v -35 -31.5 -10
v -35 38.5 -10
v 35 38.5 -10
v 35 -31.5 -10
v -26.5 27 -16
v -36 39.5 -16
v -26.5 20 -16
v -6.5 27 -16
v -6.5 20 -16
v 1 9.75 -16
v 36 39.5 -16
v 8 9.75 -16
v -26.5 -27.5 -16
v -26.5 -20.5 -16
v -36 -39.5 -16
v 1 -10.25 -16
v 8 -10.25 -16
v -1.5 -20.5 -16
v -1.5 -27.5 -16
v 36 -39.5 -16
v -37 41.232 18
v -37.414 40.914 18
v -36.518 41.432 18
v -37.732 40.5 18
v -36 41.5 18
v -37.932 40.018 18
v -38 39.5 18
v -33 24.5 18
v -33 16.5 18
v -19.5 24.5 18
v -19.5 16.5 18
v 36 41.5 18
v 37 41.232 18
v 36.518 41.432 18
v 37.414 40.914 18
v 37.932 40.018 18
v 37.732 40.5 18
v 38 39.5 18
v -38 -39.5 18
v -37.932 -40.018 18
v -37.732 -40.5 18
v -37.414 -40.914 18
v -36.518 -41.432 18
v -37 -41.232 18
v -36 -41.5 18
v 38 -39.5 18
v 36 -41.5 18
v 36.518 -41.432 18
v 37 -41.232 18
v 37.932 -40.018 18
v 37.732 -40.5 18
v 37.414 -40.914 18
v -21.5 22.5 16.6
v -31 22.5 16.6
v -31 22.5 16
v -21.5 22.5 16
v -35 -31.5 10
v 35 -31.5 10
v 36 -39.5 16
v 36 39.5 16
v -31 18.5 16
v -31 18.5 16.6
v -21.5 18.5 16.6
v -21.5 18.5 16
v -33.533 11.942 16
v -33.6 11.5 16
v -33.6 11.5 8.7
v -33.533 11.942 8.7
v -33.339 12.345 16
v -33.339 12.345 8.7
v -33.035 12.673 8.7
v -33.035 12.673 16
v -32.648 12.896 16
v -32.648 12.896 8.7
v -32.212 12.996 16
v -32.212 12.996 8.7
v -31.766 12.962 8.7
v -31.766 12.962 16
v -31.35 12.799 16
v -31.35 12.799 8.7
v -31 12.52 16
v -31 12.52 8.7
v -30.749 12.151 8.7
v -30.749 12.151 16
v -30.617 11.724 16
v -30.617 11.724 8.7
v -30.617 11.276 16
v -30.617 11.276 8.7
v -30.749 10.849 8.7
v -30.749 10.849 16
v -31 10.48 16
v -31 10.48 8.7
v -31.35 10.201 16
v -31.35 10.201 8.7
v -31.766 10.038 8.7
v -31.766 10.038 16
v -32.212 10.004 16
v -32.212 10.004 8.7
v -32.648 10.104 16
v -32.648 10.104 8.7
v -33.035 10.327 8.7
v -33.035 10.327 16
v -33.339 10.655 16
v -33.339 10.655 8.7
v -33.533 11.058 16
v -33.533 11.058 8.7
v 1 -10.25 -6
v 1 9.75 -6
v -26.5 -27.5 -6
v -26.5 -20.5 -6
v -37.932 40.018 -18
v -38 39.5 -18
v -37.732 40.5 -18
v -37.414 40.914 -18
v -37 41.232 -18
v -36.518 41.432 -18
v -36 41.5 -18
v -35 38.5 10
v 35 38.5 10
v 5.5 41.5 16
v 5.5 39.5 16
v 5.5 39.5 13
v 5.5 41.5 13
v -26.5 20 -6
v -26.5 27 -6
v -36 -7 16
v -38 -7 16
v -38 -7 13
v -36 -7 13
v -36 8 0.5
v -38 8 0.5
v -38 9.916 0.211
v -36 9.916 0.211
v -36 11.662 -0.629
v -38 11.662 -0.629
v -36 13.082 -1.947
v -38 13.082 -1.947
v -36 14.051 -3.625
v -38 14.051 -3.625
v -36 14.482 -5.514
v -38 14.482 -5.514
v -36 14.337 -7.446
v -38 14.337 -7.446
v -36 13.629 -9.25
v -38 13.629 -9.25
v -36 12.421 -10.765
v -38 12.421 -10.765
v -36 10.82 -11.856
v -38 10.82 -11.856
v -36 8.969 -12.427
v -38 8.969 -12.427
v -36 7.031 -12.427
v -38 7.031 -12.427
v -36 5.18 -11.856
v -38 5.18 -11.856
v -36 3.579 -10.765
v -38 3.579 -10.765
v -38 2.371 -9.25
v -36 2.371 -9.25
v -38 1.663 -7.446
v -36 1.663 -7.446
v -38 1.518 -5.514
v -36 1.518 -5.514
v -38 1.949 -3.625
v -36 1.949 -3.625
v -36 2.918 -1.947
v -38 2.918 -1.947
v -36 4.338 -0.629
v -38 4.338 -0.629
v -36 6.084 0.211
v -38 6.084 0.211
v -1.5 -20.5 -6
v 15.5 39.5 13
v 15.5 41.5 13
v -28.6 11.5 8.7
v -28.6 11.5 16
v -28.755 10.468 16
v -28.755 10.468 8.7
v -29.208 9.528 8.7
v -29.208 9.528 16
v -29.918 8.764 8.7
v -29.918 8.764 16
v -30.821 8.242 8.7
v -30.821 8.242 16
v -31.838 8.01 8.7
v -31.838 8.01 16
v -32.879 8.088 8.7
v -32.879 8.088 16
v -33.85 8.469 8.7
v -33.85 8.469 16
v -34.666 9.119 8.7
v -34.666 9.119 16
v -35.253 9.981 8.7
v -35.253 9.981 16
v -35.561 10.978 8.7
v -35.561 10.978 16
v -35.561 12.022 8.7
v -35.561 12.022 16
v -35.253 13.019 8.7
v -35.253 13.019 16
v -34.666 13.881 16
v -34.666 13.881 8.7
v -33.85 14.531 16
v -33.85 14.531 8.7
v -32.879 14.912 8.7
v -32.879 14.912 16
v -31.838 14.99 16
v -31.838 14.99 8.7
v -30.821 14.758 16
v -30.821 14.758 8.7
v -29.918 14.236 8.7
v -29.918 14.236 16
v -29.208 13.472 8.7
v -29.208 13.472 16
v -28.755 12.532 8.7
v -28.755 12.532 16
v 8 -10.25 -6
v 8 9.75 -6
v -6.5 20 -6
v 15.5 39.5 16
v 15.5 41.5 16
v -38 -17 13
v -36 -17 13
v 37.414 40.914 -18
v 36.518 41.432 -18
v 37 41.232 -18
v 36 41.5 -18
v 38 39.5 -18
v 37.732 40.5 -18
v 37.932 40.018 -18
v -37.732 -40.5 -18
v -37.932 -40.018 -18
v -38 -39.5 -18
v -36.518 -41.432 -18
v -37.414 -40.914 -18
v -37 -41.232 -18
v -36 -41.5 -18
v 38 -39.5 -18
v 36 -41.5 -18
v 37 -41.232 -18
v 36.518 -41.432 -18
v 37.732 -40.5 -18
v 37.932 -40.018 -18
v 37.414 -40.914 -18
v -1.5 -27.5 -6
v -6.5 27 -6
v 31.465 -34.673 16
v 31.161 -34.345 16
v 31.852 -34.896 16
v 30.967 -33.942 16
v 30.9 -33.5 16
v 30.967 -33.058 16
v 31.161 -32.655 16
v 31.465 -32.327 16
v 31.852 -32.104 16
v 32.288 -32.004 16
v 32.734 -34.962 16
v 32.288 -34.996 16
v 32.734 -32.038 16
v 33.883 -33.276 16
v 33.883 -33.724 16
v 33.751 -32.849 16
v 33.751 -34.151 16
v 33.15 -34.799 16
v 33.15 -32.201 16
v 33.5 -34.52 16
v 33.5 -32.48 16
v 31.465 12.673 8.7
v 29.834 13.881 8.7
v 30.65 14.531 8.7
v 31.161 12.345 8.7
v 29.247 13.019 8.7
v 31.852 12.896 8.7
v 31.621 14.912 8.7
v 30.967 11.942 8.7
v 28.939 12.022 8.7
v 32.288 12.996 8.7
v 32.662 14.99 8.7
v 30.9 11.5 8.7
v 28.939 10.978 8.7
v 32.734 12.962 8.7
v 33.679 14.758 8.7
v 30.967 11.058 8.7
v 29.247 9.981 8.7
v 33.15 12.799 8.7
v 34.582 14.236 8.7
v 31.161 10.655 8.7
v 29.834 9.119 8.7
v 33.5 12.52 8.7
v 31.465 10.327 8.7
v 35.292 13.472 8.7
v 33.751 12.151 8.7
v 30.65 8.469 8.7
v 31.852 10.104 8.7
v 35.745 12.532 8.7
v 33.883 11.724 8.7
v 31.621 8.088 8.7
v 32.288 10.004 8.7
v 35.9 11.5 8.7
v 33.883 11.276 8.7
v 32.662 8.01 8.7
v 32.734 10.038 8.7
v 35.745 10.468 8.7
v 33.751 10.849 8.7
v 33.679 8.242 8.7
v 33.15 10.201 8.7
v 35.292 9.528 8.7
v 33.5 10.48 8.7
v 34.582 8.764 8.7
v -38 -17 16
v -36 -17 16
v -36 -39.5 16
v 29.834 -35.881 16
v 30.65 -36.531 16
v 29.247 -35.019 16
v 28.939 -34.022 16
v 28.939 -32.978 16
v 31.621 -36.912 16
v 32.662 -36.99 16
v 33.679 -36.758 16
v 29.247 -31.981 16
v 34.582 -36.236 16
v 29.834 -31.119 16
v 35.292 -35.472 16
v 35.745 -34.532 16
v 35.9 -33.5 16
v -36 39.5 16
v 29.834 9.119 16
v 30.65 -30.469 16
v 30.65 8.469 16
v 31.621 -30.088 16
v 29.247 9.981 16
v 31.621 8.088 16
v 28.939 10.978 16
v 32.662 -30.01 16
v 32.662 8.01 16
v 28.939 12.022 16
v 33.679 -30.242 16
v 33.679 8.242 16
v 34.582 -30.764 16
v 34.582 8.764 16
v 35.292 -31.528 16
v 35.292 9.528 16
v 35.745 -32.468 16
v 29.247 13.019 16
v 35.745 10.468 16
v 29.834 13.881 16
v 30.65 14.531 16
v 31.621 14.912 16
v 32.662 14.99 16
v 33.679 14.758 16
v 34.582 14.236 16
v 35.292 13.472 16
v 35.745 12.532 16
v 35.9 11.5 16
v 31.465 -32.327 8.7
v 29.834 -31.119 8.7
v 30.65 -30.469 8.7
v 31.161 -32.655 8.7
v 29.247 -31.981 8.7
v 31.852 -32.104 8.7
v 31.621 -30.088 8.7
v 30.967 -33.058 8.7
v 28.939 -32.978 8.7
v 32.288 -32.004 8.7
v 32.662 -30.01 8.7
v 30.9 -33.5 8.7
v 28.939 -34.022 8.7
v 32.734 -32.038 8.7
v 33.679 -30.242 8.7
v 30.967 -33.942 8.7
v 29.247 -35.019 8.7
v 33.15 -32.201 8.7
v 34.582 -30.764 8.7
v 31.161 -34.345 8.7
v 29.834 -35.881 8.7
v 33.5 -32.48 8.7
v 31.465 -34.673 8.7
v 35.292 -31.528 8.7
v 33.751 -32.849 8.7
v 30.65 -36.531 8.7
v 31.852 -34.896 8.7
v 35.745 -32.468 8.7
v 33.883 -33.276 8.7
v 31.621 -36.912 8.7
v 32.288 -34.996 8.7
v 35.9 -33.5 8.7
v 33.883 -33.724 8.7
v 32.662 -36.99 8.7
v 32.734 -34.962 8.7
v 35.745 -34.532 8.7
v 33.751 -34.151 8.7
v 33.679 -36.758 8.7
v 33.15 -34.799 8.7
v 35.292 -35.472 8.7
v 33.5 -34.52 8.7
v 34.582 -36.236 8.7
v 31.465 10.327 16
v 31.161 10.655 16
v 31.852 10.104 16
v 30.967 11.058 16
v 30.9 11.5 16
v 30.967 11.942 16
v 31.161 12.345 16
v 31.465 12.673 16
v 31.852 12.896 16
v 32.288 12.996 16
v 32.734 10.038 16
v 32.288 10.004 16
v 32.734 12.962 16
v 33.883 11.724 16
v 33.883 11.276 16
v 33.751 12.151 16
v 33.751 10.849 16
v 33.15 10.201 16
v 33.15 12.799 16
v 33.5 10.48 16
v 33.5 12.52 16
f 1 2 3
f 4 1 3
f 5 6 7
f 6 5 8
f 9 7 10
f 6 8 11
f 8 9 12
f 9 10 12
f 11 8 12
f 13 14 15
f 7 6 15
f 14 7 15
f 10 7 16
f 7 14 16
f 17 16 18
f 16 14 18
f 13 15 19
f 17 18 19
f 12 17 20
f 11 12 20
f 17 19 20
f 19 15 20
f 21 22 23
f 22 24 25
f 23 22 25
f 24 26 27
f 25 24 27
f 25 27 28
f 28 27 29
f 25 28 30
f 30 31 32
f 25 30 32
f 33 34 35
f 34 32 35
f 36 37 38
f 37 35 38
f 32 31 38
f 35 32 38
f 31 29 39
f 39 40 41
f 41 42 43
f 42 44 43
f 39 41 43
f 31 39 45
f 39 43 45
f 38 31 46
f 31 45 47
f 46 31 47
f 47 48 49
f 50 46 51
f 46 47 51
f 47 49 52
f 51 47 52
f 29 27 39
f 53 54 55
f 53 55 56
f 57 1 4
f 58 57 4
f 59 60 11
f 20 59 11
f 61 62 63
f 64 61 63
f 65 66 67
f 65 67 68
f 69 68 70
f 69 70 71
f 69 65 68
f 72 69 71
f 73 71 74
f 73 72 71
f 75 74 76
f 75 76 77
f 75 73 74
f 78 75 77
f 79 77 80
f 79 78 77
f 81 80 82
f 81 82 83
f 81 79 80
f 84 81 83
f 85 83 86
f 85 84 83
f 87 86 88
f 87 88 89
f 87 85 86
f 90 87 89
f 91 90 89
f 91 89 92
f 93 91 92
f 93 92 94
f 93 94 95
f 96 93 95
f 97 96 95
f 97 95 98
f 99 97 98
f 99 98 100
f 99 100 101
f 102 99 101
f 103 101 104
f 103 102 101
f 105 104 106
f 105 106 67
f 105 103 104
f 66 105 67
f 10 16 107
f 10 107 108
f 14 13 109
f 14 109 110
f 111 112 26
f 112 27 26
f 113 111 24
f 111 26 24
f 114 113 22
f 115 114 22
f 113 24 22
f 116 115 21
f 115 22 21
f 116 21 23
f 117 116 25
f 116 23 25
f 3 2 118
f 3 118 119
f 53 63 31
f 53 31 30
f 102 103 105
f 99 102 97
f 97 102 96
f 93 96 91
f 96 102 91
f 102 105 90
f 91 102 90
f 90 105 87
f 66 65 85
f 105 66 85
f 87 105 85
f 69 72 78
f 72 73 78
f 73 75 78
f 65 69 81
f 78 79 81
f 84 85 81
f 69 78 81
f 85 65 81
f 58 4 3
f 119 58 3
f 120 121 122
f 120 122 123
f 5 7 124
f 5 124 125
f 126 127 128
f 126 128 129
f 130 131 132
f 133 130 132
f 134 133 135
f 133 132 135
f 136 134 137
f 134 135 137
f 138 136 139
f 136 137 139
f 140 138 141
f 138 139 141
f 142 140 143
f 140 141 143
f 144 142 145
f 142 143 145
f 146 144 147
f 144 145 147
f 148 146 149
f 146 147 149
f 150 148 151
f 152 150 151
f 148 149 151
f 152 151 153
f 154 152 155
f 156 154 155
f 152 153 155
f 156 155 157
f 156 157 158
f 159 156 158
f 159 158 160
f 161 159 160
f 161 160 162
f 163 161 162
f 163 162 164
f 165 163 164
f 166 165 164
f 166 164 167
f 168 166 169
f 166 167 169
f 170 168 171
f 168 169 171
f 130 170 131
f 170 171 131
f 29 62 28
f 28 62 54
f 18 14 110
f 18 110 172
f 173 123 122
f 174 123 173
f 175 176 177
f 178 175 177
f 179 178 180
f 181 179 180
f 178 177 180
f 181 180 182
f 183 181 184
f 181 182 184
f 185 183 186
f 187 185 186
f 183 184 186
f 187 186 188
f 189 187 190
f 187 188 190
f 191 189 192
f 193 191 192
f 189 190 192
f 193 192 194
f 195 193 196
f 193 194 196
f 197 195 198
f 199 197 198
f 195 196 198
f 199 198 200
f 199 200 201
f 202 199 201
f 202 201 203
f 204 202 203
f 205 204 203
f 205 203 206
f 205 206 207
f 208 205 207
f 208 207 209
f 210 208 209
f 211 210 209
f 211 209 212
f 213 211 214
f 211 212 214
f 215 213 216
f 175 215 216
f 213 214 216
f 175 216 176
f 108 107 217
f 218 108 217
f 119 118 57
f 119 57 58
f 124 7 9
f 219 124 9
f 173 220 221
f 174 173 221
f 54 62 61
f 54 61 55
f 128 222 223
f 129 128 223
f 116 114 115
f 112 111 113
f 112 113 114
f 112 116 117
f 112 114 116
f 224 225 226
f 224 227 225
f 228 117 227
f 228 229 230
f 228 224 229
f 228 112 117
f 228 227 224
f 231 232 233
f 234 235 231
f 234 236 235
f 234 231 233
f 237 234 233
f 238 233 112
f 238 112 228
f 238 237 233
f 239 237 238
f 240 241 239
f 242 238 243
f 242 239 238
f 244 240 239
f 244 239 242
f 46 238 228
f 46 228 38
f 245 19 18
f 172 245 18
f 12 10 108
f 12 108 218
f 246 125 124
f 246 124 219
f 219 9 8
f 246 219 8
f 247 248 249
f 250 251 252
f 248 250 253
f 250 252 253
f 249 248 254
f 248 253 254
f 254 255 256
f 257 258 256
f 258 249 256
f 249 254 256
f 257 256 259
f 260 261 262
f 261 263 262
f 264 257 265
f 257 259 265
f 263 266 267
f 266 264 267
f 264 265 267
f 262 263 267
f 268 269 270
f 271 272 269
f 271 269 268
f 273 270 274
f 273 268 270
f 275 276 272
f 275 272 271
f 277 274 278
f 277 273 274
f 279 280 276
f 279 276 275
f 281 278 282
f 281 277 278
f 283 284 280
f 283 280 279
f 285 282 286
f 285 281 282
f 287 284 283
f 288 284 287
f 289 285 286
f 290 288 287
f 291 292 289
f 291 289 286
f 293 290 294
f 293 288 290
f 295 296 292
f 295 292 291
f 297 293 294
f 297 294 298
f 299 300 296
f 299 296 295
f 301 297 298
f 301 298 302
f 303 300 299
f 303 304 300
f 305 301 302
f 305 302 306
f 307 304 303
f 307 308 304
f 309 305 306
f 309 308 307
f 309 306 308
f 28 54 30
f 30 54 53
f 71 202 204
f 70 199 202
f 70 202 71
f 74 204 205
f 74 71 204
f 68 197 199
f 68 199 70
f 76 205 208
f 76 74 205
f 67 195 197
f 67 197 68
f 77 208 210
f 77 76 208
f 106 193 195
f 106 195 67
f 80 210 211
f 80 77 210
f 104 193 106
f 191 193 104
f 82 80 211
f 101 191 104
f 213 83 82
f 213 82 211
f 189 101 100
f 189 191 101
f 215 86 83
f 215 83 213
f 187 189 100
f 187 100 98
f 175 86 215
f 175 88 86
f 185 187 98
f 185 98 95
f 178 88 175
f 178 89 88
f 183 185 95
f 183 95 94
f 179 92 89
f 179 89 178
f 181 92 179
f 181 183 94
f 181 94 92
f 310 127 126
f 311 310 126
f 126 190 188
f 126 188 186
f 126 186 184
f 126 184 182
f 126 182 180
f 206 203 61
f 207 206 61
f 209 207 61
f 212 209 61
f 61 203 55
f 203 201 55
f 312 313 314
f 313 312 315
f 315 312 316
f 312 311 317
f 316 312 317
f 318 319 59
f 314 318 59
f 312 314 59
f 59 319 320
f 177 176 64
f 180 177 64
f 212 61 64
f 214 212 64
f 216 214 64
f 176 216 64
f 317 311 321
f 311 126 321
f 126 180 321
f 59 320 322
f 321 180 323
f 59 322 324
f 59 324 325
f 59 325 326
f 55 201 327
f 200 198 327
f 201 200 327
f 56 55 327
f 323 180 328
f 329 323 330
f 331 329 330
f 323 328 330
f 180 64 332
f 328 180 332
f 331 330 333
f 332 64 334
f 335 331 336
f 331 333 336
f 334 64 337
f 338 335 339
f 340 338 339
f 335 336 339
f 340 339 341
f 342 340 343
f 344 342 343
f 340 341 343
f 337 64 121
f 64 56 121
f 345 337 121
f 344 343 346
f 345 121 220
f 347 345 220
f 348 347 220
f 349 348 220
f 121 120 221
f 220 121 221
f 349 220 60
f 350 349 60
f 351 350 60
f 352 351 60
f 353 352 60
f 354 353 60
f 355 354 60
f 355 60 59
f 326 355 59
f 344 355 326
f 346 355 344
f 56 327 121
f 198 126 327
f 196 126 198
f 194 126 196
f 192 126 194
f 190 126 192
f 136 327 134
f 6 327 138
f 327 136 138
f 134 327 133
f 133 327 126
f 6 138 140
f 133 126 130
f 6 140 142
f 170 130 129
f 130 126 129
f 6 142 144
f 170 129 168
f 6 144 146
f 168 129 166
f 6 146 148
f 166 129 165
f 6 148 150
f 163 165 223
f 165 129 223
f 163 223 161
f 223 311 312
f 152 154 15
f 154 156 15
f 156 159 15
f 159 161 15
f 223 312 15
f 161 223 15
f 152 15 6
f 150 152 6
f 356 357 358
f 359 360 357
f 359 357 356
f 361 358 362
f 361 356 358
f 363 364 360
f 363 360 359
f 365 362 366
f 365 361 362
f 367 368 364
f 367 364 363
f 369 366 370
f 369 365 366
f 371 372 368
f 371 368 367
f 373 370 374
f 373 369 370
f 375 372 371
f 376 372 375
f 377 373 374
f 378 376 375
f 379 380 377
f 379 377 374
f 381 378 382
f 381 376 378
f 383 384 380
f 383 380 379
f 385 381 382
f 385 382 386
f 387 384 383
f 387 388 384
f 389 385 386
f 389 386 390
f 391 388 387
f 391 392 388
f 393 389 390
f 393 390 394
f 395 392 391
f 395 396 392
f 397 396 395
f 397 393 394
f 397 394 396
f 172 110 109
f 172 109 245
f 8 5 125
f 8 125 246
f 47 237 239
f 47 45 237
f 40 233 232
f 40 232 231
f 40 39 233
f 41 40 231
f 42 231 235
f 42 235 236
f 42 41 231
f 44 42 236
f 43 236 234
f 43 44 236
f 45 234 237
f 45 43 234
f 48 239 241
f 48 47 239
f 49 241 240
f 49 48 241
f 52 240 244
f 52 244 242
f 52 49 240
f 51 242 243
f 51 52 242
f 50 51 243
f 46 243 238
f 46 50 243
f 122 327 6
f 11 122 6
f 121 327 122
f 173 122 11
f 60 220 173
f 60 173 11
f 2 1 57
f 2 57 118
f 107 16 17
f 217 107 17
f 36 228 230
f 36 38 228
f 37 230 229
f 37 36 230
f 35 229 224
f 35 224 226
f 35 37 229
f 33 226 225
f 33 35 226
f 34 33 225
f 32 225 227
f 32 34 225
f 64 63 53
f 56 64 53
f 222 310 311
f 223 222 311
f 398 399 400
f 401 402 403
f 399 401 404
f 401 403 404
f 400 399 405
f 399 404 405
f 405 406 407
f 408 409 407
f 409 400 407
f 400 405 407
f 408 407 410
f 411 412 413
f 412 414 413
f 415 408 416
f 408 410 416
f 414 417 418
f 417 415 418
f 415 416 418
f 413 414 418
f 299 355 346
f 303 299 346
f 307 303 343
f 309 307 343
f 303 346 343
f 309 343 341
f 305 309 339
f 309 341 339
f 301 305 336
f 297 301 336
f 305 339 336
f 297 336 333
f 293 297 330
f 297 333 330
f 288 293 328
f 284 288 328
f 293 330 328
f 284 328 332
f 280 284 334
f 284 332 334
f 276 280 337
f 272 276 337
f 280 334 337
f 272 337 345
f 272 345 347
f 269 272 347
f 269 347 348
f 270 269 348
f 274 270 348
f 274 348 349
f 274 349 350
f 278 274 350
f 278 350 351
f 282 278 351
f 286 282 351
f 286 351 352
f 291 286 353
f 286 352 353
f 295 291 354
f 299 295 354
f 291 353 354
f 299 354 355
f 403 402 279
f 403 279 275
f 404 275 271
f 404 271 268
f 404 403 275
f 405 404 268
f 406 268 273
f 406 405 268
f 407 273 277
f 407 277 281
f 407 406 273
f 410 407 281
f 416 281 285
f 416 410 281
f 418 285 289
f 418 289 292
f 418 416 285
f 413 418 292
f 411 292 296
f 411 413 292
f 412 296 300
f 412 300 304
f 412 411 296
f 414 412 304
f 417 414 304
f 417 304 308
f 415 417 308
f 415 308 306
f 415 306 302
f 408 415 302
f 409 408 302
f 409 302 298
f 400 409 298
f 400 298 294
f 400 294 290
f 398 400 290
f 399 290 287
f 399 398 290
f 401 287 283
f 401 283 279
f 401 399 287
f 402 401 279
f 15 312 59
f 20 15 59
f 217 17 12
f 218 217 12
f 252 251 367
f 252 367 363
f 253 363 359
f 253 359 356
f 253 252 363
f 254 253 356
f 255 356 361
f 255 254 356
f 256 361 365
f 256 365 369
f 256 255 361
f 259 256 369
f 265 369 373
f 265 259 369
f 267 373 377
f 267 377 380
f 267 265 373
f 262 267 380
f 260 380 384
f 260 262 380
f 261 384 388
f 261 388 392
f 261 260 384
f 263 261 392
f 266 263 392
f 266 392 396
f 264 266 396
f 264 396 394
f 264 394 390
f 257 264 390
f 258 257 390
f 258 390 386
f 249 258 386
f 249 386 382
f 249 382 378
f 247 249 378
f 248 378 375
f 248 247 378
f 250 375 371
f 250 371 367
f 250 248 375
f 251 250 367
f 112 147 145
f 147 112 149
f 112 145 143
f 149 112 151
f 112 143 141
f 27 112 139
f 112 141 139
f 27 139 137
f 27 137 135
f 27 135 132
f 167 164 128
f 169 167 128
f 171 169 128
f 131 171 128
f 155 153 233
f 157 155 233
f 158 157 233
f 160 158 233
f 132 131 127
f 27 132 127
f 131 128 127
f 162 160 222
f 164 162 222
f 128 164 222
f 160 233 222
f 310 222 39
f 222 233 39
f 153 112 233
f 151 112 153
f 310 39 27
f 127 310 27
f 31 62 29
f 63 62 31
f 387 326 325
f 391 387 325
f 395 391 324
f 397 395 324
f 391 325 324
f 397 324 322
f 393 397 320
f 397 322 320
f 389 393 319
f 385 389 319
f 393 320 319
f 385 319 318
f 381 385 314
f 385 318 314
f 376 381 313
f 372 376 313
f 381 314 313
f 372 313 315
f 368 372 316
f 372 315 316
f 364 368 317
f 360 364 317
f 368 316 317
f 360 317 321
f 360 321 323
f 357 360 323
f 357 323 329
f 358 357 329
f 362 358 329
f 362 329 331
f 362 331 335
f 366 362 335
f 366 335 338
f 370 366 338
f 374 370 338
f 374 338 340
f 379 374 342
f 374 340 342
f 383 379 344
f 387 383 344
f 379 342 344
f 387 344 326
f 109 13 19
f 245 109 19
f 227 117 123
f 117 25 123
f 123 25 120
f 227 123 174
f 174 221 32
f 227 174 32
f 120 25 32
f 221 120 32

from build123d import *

# Parameters (mm, degrees)
BOSS_EXTRUDE2_DEPTH      = 39.5
BOSS_EXTRUDE2_DEPTH_BACK = 39.5
SKETCH1_W                = 76
SKETCH1_H                = 36
SKETCH1_W_2              = 72
SKETCH1_H_2              = 32
SKETCH2_W                = 76
SKETCH2_H                = 36
BOSS_EXTRUDE3_DEPTH      = 2
BOSS_EXTRUDE4_DEPTH      = 10
BOSS_EXTRUDE4_DEPTH_BACK = 10
SKETCH6_W                = 70
SKETCH6_H                = 70
FILLET1_R                = 2
SKETCH7_W                = 2
SKETCH7_H                = 10
SKETCH7_W_2              = 10
SKETCH7_H_2              = 2
CUT_EXTRUDE1_DEPTH       = 3
SKETCH8_R                = 6.5
CUT_EXTRUDE2_DEPTH       = 2
SKETCH9_W                = 20
SKETCH9_H                = 7
SKETCH9_W_2              = 25
SKETCH9_W_3              = 7
SKETCH9_H_2              = 20
BOSS_EXTRUDE5_DEPTH      = 10
SKETCH10_W               = 9.5
SKETCH10_H               = 4
CUT_EXTRUDE3_DEPTH       = 2
CHAMFER1_SIZE            = 2
CHAMFER1_SIZE2           = 1.400415076
SKETCH11_R               = 3.5
SKETCH11_R_2             = 1.5
BOSS_EXTRUDE10_DEPTH     = 7.3


with BuildPart() as part:
    # Sketch1 → Boss-Extrude2 (new, two sides: drawn at the far end of the back side and taken through both)
    with BuildSketch(Plane(origin=(0, 0, 0), x_dir=(1, 0, 0), z_dir=(0, 1, 0)).offset(-BOSS_EXTRUDE2_DEPTH_BACK)):
        Rectangle(SKETCH1_W, SKETCH1_H)
        Rectangle(SKETCH1_W_2, SKETCH1_H_2, mode=Mode.SUBTRACT)
    extrude(amount=BOSS_EXTRUDE2_DEPTH + BOSS_EXTRUDE2_DEPTH_BACK)

    # Sketch2 → Boss-Extrude3 (add)
    with BuildSketch(Plane.XZ.offset(39.5)):
        Rectangle(SKETCH2_W, SKETCH2_H)
    boss_extrude3 = extrude(amount=BOSS_EXTRUDE3_DEPTH)

    # Mirror1: Boss-Extrude3 across plane
    add(boss_extrude3.mirror(Plane.ZX))

    # Fillet1
    fillet1_edges = [part.edges().sort_by_distance(p)[0] for p in [
        (38, -41.5, 0),
        (-38, -41.5, 0),
        (38, 41.5, 0),
        (-38, 41.5, 0),
    ]]
    fillet(fillet1_edges, radius=FILLET1_R)

    # Sketch7 → Cut-Extrude1 (cut)
    with BuildSketch(Plane.XY.offset(16)):
        with Locations((-37, -12)):
            Rectangle(SKETCH7_W, SKETCH7_H)
        with Locations((10.5, 40.5)):
            Rectangle(SKETCH7_W_2, SKETCH7_H_2)
    extrude(amount=-CUT_EXTRUDE1_DEPTH, mode=Mode.SUBTRACT)

    # Sketch8 → Cut-Extrude2 (cut)
    with BuildSketch(Plane.ZY.offset(38)):
        with Locations((-6, 8)):
            Circle(SKETCH8_R)
    extrude(amount=-CUT_EXTRUDE2_DEPTH, mode=Mode.SUBTRACT)

    # Sketch9 → Boss-Extrude5 (add)
    with BuildSketch(Plane.XY.offset(-16)):
        with Locations((-16.5, 23.5)):
            Rectangle(SKETCH9_W, SKETCH9_H)
        with Locations((-14, -24)):
            Rectangle(SKETCH9_W_2, SKETCH9_H)
        with Locations((4.5, -0.25)):
            Rectangle(SKETCH9_W_3, SKETCH9_H_2)
    extrude(amount=BOSS_EXTRUDE5_DEPTH)

    # Sketch10 → Cut-Extrude3 (cut)
    with BuildSketch(Plane.XY.offset(18)):
        with Locations((-26.25, 20.5)):
            Rectangle(SKETCH10_W, SKETCH10_H)
    extrude(amount=-CUT_EXTRUDE3_DEPTH, mode=Mode.SUBTRACT)

    # Chamfer1
    chamfer1_edges = [part.edges().sort_by_distance(p)[0] for p in [
        (-21.5, 20.5, 18),
        (-26.25, 22.5, 18),
        (-31, 20.5, 18),
        (-26.25, 18.5, 18),
    ]]
    chamfer1_side = [part.faces().sort_by_distance(p)[0] for p in [
        (0.15917808, -0.1243105, 18),
    ]]
    chamfer(chamfer1_edges, length=CHAMFER1_SIZE, length2=CHAMFER1_SIZE2, reference=chamfer1_side[0])

    # Sketch11 → Boss-Extrude10 (add)
    # profile 1 of 3: a face of its own
    with BuildSketch(Plane(origin=(0, 0, 16), x_dir=(-1, 0, 0), z_dir=(0, 0, -1))):
        with Locations(Location((32.1, 11.5, 0), (0, 0, 180))):
            Circle(SKETCH11_R)
        with Locations((32.1, 11.5)):
            Circle(SKETCH11_R_2, mode=Mode.SUBTRACT)
    # profile 2 of 3: a face of its own
    with BuildSketch(Plane(origin=(0, 0, 16), x_dir=(-1, 0, 0), z_dir=(0, 0, -1))):
        with Locations(Location((-32.4, -33.5, 0), (0, 0, 180))):
            Circle(SKETCH11_R)
        with Locations((-32.4, -33.5)):
            Circle(SKETCH11_R_2, mode=Mode.SUBTRACT)
    # profile 3 of 3: a face of its own
    with BuildSketch(Plane(origin=(0, 0, 16), x_dir=(-1, 0, 0), z_dir=(0, 0, -1))):
        with Locations(Location((-32.4, 11.5, 0), (0, 0, 180))):
            Circle(SKETCH11_R)
        with Locations((-32.4, 11.5)):
            Circle(SKETCH11_R_2, mode=Mode.SUBTRACT)
    extrude(amount=BOSS_EXTRUDE10_DEPTH)


with BuildPart() as body_2:
    # Sketch6 → Boss-Extrude4 (new, two sides: drawn at the far end of the back side and taken through both)
    with BuildSketch(Plane.XY.offset(-BOSS_EXTRUDE4_DEPTH_BACK)):
        with Locations((0, 3.5)):
            Rectangle(SKETCH6_W, SKETCH6_H)
    extrude(amount=BOSS_EXTRUDE4_DEPTH + BOSS_EXTRUDE4_DEPTH_BACK)


solid = Compound([part.part, body_2.part])
